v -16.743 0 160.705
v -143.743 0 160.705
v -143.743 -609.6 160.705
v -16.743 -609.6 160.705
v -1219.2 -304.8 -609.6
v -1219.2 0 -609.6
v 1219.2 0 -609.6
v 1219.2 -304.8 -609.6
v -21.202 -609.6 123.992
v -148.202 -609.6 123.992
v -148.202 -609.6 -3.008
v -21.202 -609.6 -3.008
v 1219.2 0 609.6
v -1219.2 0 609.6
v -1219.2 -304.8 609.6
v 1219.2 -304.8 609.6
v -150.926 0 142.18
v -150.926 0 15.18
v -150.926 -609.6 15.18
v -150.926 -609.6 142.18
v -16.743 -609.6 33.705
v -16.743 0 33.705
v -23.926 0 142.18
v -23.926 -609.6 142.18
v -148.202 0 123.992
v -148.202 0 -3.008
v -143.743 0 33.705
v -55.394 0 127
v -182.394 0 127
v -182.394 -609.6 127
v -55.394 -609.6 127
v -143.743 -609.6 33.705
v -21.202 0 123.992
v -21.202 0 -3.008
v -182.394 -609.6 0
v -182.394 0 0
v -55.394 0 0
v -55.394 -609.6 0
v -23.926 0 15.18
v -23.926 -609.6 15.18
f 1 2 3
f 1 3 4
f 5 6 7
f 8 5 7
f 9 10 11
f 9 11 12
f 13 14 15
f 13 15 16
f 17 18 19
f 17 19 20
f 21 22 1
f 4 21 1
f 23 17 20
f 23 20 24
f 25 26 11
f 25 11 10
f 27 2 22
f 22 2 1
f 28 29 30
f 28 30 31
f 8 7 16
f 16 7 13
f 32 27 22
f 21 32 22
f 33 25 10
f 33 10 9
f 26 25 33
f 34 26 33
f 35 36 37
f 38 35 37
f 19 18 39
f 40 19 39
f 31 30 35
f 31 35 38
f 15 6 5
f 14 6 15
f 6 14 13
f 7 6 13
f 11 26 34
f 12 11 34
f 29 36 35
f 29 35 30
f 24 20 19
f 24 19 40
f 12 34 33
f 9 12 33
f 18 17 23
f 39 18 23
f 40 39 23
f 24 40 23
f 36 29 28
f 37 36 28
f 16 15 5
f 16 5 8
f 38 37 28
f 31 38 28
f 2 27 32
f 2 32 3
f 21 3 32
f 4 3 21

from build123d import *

# Parameters (mm, degrees)
F0_W     = 2438.4
F0_H     = 1219.2
F1_DEPTH = 304.8
F2_W     = 127
F2_H     = 127
F6_DEPTH = 609.6
F3_W     = 127
F3_H     = 127
F7_DEPTH = 609.6
F5_W     = 127
F5_H     = 127
F8_DEPTH = 609.6
F4_W     = 127
F4_H     = 127
F9_DEPTH = 609.6


with BuildPart() as f1:
    # F0 (on Front) → F1 (new body)
    with BuildSketch(Plane.XZ):
        Rectangle(F0_W, F0_H)
    extrude(amount=F1_DEPTH)


with BuildPart() as f6:
    # F2 (on Front) → F6 (new body)
    with BuildSketch(Plane.XZ):
        with Locations((-80.242533, 97.205307)):
            Rectangle(F2_W, F2_H)
    extrude(amount=F6_DEPTH)


with BuildPart() as f7:
    # F3 (on Front) → F7 (new body)
    with BuildSketch(Plane.XZ):
        with Locations((-118.89429, 63.5)):
            Rectangle(F3_W, F3_H)
    extrude(amount=F7_DEPTH)


with BuildPart() as f8:
    # F5 (on Front) → F8 (new body)
    with BuildSketch(Plane.XZ):
        with Locations((-84.702347, 60.492218)):
            Rectangle(F5_W, F5_H)
    extrude(amount=F8_DEPTH)


with BuildPart() as f9:
    # F4 (on Front) → F9 (new body)
    with BuildSketch(Plane.XZ):
        with Locations((-87.426376, 78.68013)):
            Rectangle(F4_W, F4_H)
    extrude(amount=F9_DEPTH)


solid = Compound([f1.part, f6.part, f7.part, f8.part, f9.part])
